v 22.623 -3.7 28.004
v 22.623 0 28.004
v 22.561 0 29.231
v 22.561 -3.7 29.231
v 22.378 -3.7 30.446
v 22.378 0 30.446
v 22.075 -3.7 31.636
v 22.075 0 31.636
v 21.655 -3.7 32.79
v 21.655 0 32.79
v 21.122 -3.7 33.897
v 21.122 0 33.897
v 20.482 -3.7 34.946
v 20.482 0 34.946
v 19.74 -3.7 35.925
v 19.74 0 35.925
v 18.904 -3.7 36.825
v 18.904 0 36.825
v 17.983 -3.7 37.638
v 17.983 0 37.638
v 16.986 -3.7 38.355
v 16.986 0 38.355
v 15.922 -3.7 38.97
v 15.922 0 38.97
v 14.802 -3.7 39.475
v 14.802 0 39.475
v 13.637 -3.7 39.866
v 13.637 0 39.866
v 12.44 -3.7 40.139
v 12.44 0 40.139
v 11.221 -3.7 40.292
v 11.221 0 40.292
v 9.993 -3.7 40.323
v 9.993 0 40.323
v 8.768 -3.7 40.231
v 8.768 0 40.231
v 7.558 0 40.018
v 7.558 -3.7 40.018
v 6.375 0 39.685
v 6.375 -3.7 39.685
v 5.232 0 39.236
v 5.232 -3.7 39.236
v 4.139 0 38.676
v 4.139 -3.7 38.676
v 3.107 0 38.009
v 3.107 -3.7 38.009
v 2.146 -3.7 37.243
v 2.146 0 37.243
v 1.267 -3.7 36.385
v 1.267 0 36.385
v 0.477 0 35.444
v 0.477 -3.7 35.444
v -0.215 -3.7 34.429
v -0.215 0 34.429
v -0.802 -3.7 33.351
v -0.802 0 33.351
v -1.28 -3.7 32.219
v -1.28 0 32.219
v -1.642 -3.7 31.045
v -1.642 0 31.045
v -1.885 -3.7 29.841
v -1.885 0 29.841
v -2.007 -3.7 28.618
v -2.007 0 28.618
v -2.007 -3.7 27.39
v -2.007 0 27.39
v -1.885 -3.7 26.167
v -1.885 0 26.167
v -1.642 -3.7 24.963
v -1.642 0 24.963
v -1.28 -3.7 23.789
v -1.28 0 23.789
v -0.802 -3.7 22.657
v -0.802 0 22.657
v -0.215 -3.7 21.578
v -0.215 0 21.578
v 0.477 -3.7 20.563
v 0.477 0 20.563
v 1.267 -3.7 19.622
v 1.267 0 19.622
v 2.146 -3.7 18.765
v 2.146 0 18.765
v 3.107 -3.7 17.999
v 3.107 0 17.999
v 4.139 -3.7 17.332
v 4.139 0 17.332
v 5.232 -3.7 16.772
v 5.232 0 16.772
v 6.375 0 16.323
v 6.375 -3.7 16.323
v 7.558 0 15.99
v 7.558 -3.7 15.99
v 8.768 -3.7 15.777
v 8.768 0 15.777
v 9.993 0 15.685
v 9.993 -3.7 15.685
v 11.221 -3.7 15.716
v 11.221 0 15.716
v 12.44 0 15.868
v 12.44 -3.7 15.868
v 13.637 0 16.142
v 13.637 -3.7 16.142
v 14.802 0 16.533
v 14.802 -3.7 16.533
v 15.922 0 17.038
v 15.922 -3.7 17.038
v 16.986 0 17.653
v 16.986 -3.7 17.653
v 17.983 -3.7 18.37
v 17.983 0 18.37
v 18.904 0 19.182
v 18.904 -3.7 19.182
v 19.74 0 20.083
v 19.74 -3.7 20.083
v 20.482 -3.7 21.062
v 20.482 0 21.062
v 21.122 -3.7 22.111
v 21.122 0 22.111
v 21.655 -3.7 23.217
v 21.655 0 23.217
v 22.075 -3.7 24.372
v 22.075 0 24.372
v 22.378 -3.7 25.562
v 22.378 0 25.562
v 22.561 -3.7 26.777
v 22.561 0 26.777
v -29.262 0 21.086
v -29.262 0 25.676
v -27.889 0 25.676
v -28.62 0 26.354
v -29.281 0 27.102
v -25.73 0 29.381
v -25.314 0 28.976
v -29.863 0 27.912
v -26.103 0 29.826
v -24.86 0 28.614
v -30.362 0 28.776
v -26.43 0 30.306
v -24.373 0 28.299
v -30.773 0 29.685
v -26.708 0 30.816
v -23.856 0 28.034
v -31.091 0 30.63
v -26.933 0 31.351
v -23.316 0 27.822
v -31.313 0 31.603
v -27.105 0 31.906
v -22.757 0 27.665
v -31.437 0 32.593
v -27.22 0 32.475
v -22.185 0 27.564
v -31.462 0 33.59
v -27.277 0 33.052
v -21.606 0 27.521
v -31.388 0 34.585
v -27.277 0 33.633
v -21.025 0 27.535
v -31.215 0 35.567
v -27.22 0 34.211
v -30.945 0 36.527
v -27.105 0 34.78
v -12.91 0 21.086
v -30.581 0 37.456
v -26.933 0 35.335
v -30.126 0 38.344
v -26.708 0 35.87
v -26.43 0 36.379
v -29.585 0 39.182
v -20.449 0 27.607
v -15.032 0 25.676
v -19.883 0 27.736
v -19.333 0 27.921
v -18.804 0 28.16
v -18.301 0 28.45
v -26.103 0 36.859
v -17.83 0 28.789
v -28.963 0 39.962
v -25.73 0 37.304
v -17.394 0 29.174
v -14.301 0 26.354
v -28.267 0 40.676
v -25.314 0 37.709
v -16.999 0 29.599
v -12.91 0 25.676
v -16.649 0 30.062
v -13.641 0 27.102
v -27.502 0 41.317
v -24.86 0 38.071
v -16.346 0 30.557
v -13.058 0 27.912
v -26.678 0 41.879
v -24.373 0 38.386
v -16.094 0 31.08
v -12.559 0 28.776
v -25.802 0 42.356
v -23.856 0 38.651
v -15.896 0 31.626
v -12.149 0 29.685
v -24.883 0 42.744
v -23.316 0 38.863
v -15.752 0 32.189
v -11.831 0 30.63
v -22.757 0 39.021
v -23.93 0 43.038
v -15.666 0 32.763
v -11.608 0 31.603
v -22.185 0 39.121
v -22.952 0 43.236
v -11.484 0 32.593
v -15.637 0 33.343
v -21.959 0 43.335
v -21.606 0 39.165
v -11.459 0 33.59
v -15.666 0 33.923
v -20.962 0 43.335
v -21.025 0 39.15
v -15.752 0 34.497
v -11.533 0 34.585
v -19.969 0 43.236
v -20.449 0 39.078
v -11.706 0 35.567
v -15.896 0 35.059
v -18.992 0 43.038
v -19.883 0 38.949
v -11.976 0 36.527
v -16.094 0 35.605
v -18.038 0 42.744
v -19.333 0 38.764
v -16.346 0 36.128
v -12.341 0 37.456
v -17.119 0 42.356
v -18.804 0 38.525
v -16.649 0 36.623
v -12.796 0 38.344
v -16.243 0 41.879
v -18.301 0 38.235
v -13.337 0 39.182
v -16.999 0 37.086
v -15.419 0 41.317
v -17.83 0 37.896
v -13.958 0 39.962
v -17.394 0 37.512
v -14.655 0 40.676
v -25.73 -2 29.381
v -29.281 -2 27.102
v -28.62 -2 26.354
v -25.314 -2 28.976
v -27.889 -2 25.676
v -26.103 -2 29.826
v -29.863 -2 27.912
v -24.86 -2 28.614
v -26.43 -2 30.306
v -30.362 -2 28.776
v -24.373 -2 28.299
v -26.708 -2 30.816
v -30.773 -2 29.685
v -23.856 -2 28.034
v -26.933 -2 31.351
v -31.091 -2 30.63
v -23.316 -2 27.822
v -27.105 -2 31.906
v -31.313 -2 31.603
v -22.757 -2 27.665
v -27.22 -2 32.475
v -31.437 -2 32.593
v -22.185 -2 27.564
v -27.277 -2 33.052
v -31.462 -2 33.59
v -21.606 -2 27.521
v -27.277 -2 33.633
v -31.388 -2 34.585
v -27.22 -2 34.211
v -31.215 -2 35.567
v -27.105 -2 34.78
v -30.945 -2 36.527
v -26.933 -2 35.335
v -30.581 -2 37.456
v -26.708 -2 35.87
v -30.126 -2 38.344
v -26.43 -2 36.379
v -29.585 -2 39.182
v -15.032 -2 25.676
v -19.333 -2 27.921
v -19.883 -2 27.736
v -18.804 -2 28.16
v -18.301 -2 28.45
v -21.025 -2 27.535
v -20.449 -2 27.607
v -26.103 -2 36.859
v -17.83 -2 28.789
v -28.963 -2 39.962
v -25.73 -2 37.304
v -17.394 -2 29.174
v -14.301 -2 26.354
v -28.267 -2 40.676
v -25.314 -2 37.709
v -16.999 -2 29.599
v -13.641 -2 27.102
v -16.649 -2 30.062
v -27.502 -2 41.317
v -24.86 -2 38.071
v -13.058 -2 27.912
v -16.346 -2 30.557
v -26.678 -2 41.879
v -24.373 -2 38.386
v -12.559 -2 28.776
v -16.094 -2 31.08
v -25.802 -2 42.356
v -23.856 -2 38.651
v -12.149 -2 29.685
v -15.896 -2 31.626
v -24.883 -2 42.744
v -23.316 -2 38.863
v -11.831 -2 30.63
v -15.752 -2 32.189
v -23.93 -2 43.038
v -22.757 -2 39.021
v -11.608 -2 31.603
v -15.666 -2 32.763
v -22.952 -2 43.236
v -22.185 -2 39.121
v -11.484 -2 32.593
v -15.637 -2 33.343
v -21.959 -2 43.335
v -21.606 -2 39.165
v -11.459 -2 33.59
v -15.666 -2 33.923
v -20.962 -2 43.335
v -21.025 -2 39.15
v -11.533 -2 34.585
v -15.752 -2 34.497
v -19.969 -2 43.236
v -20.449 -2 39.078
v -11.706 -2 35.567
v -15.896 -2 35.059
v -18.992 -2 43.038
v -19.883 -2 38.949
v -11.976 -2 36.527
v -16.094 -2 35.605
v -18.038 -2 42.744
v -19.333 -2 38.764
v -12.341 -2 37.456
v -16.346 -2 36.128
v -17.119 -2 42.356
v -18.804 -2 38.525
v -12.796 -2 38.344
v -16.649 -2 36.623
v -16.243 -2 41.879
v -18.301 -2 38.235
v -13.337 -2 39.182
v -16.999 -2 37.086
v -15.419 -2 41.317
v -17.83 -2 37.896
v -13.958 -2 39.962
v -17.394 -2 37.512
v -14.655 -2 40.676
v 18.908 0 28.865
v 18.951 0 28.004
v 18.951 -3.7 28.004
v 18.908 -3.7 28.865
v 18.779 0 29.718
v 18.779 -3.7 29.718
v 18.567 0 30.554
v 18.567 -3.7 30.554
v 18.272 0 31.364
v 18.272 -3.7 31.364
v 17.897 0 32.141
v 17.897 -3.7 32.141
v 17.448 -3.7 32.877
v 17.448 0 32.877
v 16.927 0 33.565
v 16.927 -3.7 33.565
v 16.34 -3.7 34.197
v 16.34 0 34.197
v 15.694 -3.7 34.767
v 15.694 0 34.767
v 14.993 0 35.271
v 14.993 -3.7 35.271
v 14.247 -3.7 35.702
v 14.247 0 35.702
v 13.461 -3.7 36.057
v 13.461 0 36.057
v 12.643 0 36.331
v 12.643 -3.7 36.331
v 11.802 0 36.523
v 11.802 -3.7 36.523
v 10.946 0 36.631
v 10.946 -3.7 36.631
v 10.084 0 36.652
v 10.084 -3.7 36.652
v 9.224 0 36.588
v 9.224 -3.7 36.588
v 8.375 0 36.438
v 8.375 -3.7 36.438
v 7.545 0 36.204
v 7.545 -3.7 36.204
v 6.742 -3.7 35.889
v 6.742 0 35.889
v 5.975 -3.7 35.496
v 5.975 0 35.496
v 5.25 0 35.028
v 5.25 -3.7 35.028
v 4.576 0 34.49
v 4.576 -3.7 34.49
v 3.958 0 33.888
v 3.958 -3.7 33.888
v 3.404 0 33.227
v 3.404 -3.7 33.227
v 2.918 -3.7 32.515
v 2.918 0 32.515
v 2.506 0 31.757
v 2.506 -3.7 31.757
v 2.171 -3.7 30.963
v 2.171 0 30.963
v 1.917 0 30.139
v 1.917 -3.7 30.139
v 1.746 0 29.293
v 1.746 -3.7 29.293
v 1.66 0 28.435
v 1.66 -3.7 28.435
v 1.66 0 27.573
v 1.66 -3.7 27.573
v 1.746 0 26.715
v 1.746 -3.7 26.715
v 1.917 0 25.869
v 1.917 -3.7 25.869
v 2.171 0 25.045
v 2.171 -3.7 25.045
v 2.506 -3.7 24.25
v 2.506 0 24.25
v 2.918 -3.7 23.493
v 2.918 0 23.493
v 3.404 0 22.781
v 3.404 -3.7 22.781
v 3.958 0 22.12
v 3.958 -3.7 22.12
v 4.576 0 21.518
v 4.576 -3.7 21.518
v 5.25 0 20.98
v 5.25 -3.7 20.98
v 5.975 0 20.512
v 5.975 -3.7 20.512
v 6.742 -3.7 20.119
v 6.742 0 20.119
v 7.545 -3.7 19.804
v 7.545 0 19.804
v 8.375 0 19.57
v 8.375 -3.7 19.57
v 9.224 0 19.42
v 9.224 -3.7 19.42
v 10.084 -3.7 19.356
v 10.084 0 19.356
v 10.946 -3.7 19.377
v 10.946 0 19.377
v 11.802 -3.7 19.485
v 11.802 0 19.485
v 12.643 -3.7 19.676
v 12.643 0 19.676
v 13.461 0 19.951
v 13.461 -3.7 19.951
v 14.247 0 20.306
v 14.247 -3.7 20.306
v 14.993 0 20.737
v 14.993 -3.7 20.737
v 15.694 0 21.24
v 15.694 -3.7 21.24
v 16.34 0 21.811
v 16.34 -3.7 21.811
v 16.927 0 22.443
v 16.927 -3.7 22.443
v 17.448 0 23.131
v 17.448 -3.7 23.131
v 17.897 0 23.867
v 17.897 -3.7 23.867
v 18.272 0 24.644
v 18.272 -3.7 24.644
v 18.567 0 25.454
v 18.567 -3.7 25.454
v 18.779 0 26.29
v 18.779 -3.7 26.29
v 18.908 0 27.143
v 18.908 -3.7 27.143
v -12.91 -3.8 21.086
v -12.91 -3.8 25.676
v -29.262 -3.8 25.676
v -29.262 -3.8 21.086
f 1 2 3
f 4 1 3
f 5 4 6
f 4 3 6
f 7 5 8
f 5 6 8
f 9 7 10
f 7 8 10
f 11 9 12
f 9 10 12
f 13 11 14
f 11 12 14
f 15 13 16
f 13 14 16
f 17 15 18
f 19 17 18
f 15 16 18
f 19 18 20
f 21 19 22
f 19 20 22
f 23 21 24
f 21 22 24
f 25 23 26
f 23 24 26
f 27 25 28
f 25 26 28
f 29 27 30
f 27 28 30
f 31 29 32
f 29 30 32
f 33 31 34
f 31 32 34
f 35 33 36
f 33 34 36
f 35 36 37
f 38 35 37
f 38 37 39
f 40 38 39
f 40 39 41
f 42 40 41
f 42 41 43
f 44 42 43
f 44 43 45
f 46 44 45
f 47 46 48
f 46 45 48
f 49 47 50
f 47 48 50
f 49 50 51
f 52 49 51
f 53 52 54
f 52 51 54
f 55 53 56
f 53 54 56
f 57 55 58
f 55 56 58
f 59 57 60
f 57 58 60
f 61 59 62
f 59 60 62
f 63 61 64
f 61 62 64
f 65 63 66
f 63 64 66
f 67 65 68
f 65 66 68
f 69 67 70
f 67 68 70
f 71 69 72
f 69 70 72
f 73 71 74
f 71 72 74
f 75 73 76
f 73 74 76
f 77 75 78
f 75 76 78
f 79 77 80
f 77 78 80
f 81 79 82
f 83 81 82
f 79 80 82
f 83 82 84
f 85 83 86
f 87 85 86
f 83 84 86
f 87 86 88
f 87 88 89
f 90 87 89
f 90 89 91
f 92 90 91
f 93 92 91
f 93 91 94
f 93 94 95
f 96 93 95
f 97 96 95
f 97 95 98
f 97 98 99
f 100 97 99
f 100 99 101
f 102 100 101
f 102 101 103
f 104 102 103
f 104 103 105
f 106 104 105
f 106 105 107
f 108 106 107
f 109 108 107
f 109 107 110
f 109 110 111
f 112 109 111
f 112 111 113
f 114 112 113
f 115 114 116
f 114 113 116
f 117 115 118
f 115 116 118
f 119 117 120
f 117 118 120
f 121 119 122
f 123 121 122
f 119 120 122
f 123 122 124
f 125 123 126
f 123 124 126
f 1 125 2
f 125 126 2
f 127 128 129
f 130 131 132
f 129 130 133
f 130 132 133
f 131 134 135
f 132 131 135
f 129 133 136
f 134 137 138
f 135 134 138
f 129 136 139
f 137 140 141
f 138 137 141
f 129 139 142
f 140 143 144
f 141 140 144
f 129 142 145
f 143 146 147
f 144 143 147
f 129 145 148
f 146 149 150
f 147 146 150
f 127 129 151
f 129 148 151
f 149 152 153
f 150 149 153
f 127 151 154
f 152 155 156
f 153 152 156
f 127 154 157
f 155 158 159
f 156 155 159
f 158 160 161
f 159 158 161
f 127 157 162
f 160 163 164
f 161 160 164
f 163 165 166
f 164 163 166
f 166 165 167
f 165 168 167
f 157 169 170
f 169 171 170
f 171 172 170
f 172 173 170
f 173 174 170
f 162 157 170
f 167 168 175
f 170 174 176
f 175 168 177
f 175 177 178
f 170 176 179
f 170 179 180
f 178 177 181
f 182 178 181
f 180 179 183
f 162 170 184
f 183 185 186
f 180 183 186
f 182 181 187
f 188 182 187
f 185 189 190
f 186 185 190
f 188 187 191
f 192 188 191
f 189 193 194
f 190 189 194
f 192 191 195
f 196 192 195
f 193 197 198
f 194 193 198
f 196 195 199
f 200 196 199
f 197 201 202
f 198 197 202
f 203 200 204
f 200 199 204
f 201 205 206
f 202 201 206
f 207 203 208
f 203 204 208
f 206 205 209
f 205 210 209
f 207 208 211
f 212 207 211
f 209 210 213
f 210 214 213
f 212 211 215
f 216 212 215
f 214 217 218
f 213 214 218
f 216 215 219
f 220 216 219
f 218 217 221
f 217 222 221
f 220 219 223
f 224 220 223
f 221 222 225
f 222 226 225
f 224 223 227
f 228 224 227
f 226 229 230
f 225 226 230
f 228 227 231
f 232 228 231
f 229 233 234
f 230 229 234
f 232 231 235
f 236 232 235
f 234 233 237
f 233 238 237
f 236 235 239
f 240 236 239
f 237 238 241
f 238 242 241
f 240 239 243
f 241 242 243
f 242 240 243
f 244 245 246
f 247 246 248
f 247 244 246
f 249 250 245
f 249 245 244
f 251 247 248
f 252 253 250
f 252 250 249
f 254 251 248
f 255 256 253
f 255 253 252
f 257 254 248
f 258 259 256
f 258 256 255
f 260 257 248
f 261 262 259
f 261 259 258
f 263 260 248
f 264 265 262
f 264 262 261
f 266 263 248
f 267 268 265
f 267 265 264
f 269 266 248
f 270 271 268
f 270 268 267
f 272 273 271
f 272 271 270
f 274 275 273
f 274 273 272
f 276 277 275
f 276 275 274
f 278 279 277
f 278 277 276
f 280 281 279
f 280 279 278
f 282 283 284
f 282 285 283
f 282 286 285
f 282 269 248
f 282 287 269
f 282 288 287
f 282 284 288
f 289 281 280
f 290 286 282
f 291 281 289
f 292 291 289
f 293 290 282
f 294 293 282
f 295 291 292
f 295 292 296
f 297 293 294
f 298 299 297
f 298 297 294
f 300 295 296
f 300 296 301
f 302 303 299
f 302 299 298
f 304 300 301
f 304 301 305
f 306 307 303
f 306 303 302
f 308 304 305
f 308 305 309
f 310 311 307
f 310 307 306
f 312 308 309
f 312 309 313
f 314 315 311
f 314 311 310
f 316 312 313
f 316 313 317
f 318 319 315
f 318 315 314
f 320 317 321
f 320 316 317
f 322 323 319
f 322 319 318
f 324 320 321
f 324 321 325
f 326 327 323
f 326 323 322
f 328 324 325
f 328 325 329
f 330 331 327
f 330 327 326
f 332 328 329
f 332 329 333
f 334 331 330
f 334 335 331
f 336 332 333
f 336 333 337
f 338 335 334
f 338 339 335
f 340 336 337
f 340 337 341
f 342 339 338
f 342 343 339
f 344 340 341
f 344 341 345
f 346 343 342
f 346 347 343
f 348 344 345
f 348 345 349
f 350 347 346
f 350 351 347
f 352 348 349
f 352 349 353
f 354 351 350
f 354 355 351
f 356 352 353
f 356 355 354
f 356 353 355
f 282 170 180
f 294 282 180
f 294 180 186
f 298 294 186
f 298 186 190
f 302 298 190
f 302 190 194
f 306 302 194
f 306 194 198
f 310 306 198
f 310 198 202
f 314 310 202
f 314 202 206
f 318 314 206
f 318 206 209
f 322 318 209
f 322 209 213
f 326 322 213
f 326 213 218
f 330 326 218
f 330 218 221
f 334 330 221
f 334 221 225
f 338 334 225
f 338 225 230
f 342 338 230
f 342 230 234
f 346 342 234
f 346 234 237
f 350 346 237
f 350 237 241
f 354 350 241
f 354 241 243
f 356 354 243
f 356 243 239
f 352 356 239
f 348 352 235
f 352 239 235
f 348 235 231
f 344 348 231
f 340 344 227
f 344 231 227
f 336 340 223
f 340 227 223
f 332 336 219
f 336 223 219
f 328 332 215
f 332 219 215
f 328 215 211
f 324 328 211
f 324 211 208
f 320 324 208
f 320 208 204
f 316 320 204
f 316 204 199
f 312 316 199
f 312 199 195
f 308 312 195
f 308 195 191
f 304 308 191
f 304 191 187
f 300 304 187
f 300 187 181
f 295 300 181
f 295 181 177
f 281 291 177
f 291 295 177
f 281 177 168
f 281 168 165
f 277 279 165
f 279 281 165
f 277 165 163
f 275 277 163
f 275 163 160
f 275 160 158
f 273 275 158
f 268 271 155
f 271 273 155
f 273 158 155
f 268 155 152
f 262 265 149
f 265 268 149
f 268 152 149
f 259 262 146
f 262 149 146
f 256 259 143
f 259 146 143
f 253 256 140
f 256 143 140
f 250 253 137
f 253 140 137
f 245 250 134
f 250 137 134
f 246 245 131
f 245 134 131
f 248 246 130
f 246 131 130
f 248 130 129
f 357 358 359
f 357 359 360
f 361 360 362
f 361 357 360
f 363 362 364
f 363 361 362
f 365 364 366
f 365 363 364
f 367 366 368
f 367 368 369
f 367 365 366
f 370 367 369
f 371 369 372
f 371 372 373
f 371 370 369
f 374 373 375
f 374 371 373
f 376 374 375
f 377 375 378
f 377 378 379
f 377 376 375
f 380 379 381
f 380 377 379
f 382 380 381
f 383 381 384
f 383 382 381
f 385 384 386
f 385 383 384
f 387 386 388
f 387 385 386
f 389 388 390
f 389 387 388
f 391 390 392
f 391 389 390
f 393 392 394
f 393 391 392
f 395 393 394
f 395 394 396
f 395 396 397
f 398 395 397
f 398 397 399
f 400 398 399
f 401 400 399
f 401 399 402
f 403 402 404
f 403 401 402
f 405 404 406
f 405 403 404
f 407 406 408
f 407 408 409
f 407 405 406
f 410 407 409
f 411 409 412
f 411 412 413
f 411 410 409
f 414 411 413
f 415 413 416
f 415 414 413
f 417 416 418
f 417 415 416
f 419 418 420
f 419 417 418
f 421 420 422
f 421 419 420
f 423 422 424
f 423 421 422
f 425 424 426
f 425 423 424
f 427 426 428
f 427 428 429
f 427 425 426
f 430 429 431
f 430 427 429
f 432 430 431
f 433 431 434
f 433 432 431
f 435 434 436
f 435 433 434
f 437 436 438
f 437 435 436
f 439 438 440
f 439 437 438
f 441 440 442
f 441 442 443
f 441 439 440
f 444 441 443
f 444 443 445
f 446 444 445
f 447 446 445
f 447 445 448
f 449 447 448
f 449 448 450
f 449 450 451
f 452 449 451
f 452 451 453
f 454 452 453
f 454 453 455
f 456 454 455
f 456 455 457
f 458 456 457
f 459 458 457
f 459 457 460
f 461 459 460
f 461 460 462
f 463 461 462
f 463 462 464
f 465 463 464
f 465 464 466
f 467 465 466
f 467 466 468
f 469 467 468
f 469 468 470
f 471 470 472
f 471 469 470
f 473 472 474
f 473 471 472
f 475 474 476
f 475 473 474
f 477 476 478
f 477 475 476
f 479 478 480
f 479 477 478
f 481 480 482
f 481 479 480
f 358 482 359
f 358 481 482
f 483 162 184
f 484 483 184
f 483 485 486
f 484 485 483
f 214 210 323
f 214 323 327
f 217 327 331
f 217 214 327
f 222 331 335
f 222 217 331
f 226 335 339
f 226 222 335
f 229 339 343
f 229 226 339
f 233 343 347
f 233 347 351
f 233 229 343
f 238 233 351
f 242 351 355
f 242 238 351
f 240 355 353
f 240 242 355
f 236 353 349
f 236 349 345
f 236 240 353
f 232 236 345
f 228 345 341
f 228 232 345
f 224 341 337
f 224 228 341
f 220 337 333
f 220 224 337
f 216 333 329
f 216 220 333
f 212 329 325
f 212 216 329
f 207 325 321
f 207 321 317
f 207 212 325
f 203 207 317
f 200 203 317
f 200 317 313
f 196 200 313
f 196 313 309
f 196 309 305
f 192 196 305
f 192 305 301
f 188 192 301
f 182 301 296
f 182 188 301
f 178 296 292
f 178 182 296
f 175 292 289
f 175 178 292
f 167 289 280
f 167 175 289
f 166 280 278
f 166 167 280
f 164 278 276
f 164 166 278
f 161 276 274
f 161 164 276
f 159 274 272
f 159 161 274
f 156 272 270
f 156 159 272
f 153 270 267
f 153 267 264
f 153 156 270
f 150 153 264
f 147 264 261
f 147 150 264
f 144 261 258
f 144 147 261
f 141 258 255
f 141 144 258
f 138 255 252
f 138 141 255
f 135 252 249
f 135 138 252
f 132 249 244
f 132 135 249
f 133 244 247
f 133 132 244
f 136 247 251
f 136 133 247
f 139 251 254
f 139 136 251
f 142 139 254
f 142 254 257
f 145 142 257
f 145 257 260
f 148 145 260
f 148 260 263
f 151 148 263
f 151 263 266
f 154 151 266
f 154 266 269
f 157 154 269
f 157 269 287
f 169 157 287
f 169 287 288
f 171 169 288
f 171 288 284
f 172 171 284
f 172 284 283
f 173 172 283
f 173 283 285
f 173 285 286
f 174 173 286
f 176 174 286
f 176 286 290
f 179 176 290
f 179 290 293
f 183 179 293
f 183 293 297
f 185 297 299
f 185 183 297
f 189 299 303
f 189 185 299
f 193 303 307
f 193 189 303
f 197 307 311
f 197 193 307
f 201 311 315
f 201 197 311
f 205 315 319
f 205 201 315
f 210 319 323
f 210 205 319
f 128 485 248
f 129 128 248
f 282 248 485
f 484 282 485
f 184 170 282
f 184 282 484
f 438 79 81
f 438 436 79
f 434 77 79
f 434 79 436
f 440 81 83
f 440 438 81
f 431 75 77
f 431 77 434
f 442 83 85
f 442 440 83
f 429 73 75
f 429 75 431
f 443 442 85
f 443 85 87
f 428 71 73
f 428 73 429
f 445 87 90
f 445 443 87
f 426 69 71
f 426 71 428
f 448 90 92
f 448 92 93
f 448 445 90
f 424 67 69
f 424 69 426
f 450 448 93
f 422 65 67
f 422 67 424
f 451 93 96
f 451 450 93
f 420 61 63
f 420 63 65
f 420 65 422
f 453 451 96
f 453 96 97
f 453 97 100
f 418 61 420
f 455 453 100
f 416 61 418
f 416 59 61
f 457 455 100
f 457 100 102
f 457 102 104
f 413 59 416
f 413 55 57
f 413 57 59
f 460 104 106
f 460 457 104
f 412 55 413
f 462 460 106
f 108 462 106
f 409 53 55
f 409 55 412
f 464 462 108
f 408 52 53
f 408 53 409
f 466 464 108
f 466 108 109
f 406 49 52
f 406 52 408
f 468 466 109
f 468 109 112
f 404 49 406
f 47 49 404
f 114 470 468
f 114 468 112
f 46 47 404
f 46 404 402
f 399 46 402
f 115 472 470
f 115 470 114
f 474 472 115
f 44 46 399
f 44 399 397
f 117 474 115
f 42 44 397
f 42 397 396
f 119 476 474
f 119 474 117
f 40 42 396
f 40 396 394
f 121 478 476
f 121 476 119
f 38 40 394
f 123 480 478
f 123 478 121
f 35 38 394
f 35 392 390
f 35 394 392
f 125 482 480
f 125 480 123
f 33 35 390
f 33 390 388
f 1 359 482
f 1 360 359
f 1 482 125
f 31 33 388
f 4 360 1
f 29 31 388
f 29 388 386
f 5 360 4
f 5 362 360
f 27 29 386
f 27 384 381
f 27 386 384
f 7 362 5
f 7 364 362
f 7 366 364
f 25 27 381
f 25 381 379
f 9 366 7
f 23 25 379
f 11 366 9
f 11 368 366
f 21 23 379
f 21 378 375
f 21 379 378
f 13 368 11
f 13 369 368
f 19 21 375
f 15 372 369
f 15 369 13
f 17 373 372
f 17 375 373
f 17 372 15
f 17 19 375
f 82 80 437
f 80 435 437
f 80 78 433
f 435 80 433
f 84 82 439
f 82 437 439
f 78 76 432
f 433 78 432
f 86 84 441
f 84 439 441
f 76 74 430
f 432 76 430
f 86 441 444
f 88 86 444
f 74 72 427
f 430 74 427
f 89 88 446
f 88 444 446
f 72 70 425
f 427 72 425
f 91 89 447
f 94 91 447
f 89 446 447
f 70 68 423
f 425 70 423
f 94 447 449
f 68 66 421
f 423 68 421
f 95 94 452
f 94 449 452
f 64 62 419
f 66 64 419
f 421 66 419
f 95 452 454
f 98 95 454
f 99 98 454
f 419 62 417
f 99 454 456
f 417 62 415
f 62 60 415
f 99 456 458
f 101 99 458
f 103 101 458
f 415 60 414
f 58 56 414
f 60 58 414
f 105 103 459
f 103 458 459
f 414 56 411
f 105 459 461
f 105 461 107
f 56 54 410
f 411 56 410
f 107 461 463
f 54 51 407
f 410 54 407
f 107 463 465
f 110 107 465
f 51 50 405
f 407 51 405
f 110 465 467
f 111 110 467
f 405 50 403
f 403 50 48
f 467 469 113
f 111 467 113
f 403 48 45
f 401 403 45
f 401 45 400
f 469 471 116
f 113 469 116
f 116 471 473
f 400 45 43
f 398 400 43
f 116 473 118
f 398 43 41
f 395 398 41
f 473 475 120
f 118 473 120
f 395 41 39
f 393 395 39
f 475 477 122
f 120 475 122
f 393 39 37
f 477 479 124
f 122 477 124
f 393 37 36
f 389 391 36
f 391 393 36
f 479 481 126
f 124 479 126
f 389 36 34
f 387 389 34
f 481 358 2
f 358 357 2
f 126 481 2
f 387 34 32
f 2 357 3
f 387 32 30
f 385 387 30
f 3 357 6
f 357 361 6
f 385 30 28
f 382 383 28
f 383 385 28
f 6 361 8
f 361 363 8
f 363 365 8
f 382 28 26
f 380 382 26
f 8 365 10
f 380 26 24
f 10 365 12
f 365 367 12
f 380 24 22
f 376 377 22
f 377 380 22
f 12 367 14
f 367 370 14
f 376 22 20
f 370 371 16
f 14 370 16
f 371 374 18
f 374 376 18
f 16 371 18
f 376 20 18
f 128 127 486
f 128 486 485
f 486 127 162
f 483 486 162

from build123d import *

# Parameters (mm, degrees)
F0_R     = 10.004828
F0_R_2   = 5.823893
F1_DEPTH = 2
F2_W     = 16.352459
F2_H     = 4.590163
F3_DEPTH = 3.8
F4_R     = 12.322716
F4_R_2   = 8.650835
F5_DEPTH = 3.7


with BuildPart() as f1:
    # F0 (on Front) → F1 (new body)
    with BuildSketch(Plane.XZ):
        with Locations((-21.460718, 33.342637)):
            Circle(F0_R)
        with Locations((-21.460718, 33.342637)):
            Circle(F0_R_2, mode=Mode.SUBTRACT)
    extrude(amount=F1_DEPTH)

    # F2 (on Front) → F3 (join)
    with BuildSketch(Plane.XZ):
        with Locations((-21.086065, 23.381149)):
            Rectangle(F2_W, F2_H)
    extrude(amount=F3_DEPTH)


with BuildPart() as f5:
    # F4 (on Front) → F5 (new body)
    with BuildSketch(Plane.XZ):
        with Locations((10.300001, 28.003922)):
            Circle(F4_R)
        with Locations((10.300001, 28.003922)):
            Circle(F4_R_2, mode=Mode.SUBTRACT)
    extrude(amount=F5_DEPTH)


solid = Compound([f1.part, f5.part])
